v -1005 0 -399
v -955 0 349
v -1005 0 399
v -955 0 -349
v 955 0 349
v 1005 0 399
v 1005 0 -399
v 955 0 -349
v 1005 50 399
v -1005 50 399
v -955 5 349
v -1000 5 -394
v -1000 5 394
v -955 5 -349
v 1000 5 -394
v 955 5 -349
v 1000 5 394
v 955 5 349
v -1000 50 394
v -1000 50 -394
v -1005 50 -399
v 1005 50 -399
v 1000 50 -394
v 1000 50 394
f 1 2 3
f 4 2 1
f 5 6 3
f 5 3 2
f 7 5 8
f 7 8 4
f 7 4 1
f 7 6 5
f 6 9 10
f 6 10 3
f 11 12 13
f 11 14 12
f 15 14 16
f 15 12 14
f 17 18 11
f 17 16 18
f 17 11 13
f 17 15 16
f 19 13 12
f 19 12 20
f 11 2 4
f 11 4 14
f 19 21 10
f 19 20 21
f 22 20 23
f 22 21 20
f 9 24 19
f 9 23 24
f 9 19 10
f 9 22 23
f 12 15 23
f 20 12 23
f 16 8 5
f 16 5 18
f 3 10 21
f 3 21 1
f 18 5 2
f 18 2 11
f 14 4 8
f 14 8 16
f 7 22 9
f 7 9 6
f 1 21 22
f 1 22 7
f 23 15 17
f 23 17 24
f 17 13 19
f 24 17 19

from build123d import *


with BuildPart() as part:
    # Sweep1: sweep along a path in Sketch2
    with BuildLine(Plane(origin=(0, 0, 0), x_dir=(1, 0, 0), z_dir=(0, 1, 0))) as sweep1_path:
        Line((-1005, -399), (1005, -399))
        Line((1005, -399), (1005, 399))
        Line((1005, 399), (-1005, 399))
        Line((-1005, 399), (-1005, -399))
    # Sketch3 → Sweep1 (sweep)
    with BuildSketch(Plane.XY):
        Polygon((-955, 0), (-1005, 0), (-1005, 50), (-1000, 50), (-1000, 5), (-955, 5), align=None)
    sweep(path=sweep1_path.line, transition=Transition.RIGHT)


solid = part.part
